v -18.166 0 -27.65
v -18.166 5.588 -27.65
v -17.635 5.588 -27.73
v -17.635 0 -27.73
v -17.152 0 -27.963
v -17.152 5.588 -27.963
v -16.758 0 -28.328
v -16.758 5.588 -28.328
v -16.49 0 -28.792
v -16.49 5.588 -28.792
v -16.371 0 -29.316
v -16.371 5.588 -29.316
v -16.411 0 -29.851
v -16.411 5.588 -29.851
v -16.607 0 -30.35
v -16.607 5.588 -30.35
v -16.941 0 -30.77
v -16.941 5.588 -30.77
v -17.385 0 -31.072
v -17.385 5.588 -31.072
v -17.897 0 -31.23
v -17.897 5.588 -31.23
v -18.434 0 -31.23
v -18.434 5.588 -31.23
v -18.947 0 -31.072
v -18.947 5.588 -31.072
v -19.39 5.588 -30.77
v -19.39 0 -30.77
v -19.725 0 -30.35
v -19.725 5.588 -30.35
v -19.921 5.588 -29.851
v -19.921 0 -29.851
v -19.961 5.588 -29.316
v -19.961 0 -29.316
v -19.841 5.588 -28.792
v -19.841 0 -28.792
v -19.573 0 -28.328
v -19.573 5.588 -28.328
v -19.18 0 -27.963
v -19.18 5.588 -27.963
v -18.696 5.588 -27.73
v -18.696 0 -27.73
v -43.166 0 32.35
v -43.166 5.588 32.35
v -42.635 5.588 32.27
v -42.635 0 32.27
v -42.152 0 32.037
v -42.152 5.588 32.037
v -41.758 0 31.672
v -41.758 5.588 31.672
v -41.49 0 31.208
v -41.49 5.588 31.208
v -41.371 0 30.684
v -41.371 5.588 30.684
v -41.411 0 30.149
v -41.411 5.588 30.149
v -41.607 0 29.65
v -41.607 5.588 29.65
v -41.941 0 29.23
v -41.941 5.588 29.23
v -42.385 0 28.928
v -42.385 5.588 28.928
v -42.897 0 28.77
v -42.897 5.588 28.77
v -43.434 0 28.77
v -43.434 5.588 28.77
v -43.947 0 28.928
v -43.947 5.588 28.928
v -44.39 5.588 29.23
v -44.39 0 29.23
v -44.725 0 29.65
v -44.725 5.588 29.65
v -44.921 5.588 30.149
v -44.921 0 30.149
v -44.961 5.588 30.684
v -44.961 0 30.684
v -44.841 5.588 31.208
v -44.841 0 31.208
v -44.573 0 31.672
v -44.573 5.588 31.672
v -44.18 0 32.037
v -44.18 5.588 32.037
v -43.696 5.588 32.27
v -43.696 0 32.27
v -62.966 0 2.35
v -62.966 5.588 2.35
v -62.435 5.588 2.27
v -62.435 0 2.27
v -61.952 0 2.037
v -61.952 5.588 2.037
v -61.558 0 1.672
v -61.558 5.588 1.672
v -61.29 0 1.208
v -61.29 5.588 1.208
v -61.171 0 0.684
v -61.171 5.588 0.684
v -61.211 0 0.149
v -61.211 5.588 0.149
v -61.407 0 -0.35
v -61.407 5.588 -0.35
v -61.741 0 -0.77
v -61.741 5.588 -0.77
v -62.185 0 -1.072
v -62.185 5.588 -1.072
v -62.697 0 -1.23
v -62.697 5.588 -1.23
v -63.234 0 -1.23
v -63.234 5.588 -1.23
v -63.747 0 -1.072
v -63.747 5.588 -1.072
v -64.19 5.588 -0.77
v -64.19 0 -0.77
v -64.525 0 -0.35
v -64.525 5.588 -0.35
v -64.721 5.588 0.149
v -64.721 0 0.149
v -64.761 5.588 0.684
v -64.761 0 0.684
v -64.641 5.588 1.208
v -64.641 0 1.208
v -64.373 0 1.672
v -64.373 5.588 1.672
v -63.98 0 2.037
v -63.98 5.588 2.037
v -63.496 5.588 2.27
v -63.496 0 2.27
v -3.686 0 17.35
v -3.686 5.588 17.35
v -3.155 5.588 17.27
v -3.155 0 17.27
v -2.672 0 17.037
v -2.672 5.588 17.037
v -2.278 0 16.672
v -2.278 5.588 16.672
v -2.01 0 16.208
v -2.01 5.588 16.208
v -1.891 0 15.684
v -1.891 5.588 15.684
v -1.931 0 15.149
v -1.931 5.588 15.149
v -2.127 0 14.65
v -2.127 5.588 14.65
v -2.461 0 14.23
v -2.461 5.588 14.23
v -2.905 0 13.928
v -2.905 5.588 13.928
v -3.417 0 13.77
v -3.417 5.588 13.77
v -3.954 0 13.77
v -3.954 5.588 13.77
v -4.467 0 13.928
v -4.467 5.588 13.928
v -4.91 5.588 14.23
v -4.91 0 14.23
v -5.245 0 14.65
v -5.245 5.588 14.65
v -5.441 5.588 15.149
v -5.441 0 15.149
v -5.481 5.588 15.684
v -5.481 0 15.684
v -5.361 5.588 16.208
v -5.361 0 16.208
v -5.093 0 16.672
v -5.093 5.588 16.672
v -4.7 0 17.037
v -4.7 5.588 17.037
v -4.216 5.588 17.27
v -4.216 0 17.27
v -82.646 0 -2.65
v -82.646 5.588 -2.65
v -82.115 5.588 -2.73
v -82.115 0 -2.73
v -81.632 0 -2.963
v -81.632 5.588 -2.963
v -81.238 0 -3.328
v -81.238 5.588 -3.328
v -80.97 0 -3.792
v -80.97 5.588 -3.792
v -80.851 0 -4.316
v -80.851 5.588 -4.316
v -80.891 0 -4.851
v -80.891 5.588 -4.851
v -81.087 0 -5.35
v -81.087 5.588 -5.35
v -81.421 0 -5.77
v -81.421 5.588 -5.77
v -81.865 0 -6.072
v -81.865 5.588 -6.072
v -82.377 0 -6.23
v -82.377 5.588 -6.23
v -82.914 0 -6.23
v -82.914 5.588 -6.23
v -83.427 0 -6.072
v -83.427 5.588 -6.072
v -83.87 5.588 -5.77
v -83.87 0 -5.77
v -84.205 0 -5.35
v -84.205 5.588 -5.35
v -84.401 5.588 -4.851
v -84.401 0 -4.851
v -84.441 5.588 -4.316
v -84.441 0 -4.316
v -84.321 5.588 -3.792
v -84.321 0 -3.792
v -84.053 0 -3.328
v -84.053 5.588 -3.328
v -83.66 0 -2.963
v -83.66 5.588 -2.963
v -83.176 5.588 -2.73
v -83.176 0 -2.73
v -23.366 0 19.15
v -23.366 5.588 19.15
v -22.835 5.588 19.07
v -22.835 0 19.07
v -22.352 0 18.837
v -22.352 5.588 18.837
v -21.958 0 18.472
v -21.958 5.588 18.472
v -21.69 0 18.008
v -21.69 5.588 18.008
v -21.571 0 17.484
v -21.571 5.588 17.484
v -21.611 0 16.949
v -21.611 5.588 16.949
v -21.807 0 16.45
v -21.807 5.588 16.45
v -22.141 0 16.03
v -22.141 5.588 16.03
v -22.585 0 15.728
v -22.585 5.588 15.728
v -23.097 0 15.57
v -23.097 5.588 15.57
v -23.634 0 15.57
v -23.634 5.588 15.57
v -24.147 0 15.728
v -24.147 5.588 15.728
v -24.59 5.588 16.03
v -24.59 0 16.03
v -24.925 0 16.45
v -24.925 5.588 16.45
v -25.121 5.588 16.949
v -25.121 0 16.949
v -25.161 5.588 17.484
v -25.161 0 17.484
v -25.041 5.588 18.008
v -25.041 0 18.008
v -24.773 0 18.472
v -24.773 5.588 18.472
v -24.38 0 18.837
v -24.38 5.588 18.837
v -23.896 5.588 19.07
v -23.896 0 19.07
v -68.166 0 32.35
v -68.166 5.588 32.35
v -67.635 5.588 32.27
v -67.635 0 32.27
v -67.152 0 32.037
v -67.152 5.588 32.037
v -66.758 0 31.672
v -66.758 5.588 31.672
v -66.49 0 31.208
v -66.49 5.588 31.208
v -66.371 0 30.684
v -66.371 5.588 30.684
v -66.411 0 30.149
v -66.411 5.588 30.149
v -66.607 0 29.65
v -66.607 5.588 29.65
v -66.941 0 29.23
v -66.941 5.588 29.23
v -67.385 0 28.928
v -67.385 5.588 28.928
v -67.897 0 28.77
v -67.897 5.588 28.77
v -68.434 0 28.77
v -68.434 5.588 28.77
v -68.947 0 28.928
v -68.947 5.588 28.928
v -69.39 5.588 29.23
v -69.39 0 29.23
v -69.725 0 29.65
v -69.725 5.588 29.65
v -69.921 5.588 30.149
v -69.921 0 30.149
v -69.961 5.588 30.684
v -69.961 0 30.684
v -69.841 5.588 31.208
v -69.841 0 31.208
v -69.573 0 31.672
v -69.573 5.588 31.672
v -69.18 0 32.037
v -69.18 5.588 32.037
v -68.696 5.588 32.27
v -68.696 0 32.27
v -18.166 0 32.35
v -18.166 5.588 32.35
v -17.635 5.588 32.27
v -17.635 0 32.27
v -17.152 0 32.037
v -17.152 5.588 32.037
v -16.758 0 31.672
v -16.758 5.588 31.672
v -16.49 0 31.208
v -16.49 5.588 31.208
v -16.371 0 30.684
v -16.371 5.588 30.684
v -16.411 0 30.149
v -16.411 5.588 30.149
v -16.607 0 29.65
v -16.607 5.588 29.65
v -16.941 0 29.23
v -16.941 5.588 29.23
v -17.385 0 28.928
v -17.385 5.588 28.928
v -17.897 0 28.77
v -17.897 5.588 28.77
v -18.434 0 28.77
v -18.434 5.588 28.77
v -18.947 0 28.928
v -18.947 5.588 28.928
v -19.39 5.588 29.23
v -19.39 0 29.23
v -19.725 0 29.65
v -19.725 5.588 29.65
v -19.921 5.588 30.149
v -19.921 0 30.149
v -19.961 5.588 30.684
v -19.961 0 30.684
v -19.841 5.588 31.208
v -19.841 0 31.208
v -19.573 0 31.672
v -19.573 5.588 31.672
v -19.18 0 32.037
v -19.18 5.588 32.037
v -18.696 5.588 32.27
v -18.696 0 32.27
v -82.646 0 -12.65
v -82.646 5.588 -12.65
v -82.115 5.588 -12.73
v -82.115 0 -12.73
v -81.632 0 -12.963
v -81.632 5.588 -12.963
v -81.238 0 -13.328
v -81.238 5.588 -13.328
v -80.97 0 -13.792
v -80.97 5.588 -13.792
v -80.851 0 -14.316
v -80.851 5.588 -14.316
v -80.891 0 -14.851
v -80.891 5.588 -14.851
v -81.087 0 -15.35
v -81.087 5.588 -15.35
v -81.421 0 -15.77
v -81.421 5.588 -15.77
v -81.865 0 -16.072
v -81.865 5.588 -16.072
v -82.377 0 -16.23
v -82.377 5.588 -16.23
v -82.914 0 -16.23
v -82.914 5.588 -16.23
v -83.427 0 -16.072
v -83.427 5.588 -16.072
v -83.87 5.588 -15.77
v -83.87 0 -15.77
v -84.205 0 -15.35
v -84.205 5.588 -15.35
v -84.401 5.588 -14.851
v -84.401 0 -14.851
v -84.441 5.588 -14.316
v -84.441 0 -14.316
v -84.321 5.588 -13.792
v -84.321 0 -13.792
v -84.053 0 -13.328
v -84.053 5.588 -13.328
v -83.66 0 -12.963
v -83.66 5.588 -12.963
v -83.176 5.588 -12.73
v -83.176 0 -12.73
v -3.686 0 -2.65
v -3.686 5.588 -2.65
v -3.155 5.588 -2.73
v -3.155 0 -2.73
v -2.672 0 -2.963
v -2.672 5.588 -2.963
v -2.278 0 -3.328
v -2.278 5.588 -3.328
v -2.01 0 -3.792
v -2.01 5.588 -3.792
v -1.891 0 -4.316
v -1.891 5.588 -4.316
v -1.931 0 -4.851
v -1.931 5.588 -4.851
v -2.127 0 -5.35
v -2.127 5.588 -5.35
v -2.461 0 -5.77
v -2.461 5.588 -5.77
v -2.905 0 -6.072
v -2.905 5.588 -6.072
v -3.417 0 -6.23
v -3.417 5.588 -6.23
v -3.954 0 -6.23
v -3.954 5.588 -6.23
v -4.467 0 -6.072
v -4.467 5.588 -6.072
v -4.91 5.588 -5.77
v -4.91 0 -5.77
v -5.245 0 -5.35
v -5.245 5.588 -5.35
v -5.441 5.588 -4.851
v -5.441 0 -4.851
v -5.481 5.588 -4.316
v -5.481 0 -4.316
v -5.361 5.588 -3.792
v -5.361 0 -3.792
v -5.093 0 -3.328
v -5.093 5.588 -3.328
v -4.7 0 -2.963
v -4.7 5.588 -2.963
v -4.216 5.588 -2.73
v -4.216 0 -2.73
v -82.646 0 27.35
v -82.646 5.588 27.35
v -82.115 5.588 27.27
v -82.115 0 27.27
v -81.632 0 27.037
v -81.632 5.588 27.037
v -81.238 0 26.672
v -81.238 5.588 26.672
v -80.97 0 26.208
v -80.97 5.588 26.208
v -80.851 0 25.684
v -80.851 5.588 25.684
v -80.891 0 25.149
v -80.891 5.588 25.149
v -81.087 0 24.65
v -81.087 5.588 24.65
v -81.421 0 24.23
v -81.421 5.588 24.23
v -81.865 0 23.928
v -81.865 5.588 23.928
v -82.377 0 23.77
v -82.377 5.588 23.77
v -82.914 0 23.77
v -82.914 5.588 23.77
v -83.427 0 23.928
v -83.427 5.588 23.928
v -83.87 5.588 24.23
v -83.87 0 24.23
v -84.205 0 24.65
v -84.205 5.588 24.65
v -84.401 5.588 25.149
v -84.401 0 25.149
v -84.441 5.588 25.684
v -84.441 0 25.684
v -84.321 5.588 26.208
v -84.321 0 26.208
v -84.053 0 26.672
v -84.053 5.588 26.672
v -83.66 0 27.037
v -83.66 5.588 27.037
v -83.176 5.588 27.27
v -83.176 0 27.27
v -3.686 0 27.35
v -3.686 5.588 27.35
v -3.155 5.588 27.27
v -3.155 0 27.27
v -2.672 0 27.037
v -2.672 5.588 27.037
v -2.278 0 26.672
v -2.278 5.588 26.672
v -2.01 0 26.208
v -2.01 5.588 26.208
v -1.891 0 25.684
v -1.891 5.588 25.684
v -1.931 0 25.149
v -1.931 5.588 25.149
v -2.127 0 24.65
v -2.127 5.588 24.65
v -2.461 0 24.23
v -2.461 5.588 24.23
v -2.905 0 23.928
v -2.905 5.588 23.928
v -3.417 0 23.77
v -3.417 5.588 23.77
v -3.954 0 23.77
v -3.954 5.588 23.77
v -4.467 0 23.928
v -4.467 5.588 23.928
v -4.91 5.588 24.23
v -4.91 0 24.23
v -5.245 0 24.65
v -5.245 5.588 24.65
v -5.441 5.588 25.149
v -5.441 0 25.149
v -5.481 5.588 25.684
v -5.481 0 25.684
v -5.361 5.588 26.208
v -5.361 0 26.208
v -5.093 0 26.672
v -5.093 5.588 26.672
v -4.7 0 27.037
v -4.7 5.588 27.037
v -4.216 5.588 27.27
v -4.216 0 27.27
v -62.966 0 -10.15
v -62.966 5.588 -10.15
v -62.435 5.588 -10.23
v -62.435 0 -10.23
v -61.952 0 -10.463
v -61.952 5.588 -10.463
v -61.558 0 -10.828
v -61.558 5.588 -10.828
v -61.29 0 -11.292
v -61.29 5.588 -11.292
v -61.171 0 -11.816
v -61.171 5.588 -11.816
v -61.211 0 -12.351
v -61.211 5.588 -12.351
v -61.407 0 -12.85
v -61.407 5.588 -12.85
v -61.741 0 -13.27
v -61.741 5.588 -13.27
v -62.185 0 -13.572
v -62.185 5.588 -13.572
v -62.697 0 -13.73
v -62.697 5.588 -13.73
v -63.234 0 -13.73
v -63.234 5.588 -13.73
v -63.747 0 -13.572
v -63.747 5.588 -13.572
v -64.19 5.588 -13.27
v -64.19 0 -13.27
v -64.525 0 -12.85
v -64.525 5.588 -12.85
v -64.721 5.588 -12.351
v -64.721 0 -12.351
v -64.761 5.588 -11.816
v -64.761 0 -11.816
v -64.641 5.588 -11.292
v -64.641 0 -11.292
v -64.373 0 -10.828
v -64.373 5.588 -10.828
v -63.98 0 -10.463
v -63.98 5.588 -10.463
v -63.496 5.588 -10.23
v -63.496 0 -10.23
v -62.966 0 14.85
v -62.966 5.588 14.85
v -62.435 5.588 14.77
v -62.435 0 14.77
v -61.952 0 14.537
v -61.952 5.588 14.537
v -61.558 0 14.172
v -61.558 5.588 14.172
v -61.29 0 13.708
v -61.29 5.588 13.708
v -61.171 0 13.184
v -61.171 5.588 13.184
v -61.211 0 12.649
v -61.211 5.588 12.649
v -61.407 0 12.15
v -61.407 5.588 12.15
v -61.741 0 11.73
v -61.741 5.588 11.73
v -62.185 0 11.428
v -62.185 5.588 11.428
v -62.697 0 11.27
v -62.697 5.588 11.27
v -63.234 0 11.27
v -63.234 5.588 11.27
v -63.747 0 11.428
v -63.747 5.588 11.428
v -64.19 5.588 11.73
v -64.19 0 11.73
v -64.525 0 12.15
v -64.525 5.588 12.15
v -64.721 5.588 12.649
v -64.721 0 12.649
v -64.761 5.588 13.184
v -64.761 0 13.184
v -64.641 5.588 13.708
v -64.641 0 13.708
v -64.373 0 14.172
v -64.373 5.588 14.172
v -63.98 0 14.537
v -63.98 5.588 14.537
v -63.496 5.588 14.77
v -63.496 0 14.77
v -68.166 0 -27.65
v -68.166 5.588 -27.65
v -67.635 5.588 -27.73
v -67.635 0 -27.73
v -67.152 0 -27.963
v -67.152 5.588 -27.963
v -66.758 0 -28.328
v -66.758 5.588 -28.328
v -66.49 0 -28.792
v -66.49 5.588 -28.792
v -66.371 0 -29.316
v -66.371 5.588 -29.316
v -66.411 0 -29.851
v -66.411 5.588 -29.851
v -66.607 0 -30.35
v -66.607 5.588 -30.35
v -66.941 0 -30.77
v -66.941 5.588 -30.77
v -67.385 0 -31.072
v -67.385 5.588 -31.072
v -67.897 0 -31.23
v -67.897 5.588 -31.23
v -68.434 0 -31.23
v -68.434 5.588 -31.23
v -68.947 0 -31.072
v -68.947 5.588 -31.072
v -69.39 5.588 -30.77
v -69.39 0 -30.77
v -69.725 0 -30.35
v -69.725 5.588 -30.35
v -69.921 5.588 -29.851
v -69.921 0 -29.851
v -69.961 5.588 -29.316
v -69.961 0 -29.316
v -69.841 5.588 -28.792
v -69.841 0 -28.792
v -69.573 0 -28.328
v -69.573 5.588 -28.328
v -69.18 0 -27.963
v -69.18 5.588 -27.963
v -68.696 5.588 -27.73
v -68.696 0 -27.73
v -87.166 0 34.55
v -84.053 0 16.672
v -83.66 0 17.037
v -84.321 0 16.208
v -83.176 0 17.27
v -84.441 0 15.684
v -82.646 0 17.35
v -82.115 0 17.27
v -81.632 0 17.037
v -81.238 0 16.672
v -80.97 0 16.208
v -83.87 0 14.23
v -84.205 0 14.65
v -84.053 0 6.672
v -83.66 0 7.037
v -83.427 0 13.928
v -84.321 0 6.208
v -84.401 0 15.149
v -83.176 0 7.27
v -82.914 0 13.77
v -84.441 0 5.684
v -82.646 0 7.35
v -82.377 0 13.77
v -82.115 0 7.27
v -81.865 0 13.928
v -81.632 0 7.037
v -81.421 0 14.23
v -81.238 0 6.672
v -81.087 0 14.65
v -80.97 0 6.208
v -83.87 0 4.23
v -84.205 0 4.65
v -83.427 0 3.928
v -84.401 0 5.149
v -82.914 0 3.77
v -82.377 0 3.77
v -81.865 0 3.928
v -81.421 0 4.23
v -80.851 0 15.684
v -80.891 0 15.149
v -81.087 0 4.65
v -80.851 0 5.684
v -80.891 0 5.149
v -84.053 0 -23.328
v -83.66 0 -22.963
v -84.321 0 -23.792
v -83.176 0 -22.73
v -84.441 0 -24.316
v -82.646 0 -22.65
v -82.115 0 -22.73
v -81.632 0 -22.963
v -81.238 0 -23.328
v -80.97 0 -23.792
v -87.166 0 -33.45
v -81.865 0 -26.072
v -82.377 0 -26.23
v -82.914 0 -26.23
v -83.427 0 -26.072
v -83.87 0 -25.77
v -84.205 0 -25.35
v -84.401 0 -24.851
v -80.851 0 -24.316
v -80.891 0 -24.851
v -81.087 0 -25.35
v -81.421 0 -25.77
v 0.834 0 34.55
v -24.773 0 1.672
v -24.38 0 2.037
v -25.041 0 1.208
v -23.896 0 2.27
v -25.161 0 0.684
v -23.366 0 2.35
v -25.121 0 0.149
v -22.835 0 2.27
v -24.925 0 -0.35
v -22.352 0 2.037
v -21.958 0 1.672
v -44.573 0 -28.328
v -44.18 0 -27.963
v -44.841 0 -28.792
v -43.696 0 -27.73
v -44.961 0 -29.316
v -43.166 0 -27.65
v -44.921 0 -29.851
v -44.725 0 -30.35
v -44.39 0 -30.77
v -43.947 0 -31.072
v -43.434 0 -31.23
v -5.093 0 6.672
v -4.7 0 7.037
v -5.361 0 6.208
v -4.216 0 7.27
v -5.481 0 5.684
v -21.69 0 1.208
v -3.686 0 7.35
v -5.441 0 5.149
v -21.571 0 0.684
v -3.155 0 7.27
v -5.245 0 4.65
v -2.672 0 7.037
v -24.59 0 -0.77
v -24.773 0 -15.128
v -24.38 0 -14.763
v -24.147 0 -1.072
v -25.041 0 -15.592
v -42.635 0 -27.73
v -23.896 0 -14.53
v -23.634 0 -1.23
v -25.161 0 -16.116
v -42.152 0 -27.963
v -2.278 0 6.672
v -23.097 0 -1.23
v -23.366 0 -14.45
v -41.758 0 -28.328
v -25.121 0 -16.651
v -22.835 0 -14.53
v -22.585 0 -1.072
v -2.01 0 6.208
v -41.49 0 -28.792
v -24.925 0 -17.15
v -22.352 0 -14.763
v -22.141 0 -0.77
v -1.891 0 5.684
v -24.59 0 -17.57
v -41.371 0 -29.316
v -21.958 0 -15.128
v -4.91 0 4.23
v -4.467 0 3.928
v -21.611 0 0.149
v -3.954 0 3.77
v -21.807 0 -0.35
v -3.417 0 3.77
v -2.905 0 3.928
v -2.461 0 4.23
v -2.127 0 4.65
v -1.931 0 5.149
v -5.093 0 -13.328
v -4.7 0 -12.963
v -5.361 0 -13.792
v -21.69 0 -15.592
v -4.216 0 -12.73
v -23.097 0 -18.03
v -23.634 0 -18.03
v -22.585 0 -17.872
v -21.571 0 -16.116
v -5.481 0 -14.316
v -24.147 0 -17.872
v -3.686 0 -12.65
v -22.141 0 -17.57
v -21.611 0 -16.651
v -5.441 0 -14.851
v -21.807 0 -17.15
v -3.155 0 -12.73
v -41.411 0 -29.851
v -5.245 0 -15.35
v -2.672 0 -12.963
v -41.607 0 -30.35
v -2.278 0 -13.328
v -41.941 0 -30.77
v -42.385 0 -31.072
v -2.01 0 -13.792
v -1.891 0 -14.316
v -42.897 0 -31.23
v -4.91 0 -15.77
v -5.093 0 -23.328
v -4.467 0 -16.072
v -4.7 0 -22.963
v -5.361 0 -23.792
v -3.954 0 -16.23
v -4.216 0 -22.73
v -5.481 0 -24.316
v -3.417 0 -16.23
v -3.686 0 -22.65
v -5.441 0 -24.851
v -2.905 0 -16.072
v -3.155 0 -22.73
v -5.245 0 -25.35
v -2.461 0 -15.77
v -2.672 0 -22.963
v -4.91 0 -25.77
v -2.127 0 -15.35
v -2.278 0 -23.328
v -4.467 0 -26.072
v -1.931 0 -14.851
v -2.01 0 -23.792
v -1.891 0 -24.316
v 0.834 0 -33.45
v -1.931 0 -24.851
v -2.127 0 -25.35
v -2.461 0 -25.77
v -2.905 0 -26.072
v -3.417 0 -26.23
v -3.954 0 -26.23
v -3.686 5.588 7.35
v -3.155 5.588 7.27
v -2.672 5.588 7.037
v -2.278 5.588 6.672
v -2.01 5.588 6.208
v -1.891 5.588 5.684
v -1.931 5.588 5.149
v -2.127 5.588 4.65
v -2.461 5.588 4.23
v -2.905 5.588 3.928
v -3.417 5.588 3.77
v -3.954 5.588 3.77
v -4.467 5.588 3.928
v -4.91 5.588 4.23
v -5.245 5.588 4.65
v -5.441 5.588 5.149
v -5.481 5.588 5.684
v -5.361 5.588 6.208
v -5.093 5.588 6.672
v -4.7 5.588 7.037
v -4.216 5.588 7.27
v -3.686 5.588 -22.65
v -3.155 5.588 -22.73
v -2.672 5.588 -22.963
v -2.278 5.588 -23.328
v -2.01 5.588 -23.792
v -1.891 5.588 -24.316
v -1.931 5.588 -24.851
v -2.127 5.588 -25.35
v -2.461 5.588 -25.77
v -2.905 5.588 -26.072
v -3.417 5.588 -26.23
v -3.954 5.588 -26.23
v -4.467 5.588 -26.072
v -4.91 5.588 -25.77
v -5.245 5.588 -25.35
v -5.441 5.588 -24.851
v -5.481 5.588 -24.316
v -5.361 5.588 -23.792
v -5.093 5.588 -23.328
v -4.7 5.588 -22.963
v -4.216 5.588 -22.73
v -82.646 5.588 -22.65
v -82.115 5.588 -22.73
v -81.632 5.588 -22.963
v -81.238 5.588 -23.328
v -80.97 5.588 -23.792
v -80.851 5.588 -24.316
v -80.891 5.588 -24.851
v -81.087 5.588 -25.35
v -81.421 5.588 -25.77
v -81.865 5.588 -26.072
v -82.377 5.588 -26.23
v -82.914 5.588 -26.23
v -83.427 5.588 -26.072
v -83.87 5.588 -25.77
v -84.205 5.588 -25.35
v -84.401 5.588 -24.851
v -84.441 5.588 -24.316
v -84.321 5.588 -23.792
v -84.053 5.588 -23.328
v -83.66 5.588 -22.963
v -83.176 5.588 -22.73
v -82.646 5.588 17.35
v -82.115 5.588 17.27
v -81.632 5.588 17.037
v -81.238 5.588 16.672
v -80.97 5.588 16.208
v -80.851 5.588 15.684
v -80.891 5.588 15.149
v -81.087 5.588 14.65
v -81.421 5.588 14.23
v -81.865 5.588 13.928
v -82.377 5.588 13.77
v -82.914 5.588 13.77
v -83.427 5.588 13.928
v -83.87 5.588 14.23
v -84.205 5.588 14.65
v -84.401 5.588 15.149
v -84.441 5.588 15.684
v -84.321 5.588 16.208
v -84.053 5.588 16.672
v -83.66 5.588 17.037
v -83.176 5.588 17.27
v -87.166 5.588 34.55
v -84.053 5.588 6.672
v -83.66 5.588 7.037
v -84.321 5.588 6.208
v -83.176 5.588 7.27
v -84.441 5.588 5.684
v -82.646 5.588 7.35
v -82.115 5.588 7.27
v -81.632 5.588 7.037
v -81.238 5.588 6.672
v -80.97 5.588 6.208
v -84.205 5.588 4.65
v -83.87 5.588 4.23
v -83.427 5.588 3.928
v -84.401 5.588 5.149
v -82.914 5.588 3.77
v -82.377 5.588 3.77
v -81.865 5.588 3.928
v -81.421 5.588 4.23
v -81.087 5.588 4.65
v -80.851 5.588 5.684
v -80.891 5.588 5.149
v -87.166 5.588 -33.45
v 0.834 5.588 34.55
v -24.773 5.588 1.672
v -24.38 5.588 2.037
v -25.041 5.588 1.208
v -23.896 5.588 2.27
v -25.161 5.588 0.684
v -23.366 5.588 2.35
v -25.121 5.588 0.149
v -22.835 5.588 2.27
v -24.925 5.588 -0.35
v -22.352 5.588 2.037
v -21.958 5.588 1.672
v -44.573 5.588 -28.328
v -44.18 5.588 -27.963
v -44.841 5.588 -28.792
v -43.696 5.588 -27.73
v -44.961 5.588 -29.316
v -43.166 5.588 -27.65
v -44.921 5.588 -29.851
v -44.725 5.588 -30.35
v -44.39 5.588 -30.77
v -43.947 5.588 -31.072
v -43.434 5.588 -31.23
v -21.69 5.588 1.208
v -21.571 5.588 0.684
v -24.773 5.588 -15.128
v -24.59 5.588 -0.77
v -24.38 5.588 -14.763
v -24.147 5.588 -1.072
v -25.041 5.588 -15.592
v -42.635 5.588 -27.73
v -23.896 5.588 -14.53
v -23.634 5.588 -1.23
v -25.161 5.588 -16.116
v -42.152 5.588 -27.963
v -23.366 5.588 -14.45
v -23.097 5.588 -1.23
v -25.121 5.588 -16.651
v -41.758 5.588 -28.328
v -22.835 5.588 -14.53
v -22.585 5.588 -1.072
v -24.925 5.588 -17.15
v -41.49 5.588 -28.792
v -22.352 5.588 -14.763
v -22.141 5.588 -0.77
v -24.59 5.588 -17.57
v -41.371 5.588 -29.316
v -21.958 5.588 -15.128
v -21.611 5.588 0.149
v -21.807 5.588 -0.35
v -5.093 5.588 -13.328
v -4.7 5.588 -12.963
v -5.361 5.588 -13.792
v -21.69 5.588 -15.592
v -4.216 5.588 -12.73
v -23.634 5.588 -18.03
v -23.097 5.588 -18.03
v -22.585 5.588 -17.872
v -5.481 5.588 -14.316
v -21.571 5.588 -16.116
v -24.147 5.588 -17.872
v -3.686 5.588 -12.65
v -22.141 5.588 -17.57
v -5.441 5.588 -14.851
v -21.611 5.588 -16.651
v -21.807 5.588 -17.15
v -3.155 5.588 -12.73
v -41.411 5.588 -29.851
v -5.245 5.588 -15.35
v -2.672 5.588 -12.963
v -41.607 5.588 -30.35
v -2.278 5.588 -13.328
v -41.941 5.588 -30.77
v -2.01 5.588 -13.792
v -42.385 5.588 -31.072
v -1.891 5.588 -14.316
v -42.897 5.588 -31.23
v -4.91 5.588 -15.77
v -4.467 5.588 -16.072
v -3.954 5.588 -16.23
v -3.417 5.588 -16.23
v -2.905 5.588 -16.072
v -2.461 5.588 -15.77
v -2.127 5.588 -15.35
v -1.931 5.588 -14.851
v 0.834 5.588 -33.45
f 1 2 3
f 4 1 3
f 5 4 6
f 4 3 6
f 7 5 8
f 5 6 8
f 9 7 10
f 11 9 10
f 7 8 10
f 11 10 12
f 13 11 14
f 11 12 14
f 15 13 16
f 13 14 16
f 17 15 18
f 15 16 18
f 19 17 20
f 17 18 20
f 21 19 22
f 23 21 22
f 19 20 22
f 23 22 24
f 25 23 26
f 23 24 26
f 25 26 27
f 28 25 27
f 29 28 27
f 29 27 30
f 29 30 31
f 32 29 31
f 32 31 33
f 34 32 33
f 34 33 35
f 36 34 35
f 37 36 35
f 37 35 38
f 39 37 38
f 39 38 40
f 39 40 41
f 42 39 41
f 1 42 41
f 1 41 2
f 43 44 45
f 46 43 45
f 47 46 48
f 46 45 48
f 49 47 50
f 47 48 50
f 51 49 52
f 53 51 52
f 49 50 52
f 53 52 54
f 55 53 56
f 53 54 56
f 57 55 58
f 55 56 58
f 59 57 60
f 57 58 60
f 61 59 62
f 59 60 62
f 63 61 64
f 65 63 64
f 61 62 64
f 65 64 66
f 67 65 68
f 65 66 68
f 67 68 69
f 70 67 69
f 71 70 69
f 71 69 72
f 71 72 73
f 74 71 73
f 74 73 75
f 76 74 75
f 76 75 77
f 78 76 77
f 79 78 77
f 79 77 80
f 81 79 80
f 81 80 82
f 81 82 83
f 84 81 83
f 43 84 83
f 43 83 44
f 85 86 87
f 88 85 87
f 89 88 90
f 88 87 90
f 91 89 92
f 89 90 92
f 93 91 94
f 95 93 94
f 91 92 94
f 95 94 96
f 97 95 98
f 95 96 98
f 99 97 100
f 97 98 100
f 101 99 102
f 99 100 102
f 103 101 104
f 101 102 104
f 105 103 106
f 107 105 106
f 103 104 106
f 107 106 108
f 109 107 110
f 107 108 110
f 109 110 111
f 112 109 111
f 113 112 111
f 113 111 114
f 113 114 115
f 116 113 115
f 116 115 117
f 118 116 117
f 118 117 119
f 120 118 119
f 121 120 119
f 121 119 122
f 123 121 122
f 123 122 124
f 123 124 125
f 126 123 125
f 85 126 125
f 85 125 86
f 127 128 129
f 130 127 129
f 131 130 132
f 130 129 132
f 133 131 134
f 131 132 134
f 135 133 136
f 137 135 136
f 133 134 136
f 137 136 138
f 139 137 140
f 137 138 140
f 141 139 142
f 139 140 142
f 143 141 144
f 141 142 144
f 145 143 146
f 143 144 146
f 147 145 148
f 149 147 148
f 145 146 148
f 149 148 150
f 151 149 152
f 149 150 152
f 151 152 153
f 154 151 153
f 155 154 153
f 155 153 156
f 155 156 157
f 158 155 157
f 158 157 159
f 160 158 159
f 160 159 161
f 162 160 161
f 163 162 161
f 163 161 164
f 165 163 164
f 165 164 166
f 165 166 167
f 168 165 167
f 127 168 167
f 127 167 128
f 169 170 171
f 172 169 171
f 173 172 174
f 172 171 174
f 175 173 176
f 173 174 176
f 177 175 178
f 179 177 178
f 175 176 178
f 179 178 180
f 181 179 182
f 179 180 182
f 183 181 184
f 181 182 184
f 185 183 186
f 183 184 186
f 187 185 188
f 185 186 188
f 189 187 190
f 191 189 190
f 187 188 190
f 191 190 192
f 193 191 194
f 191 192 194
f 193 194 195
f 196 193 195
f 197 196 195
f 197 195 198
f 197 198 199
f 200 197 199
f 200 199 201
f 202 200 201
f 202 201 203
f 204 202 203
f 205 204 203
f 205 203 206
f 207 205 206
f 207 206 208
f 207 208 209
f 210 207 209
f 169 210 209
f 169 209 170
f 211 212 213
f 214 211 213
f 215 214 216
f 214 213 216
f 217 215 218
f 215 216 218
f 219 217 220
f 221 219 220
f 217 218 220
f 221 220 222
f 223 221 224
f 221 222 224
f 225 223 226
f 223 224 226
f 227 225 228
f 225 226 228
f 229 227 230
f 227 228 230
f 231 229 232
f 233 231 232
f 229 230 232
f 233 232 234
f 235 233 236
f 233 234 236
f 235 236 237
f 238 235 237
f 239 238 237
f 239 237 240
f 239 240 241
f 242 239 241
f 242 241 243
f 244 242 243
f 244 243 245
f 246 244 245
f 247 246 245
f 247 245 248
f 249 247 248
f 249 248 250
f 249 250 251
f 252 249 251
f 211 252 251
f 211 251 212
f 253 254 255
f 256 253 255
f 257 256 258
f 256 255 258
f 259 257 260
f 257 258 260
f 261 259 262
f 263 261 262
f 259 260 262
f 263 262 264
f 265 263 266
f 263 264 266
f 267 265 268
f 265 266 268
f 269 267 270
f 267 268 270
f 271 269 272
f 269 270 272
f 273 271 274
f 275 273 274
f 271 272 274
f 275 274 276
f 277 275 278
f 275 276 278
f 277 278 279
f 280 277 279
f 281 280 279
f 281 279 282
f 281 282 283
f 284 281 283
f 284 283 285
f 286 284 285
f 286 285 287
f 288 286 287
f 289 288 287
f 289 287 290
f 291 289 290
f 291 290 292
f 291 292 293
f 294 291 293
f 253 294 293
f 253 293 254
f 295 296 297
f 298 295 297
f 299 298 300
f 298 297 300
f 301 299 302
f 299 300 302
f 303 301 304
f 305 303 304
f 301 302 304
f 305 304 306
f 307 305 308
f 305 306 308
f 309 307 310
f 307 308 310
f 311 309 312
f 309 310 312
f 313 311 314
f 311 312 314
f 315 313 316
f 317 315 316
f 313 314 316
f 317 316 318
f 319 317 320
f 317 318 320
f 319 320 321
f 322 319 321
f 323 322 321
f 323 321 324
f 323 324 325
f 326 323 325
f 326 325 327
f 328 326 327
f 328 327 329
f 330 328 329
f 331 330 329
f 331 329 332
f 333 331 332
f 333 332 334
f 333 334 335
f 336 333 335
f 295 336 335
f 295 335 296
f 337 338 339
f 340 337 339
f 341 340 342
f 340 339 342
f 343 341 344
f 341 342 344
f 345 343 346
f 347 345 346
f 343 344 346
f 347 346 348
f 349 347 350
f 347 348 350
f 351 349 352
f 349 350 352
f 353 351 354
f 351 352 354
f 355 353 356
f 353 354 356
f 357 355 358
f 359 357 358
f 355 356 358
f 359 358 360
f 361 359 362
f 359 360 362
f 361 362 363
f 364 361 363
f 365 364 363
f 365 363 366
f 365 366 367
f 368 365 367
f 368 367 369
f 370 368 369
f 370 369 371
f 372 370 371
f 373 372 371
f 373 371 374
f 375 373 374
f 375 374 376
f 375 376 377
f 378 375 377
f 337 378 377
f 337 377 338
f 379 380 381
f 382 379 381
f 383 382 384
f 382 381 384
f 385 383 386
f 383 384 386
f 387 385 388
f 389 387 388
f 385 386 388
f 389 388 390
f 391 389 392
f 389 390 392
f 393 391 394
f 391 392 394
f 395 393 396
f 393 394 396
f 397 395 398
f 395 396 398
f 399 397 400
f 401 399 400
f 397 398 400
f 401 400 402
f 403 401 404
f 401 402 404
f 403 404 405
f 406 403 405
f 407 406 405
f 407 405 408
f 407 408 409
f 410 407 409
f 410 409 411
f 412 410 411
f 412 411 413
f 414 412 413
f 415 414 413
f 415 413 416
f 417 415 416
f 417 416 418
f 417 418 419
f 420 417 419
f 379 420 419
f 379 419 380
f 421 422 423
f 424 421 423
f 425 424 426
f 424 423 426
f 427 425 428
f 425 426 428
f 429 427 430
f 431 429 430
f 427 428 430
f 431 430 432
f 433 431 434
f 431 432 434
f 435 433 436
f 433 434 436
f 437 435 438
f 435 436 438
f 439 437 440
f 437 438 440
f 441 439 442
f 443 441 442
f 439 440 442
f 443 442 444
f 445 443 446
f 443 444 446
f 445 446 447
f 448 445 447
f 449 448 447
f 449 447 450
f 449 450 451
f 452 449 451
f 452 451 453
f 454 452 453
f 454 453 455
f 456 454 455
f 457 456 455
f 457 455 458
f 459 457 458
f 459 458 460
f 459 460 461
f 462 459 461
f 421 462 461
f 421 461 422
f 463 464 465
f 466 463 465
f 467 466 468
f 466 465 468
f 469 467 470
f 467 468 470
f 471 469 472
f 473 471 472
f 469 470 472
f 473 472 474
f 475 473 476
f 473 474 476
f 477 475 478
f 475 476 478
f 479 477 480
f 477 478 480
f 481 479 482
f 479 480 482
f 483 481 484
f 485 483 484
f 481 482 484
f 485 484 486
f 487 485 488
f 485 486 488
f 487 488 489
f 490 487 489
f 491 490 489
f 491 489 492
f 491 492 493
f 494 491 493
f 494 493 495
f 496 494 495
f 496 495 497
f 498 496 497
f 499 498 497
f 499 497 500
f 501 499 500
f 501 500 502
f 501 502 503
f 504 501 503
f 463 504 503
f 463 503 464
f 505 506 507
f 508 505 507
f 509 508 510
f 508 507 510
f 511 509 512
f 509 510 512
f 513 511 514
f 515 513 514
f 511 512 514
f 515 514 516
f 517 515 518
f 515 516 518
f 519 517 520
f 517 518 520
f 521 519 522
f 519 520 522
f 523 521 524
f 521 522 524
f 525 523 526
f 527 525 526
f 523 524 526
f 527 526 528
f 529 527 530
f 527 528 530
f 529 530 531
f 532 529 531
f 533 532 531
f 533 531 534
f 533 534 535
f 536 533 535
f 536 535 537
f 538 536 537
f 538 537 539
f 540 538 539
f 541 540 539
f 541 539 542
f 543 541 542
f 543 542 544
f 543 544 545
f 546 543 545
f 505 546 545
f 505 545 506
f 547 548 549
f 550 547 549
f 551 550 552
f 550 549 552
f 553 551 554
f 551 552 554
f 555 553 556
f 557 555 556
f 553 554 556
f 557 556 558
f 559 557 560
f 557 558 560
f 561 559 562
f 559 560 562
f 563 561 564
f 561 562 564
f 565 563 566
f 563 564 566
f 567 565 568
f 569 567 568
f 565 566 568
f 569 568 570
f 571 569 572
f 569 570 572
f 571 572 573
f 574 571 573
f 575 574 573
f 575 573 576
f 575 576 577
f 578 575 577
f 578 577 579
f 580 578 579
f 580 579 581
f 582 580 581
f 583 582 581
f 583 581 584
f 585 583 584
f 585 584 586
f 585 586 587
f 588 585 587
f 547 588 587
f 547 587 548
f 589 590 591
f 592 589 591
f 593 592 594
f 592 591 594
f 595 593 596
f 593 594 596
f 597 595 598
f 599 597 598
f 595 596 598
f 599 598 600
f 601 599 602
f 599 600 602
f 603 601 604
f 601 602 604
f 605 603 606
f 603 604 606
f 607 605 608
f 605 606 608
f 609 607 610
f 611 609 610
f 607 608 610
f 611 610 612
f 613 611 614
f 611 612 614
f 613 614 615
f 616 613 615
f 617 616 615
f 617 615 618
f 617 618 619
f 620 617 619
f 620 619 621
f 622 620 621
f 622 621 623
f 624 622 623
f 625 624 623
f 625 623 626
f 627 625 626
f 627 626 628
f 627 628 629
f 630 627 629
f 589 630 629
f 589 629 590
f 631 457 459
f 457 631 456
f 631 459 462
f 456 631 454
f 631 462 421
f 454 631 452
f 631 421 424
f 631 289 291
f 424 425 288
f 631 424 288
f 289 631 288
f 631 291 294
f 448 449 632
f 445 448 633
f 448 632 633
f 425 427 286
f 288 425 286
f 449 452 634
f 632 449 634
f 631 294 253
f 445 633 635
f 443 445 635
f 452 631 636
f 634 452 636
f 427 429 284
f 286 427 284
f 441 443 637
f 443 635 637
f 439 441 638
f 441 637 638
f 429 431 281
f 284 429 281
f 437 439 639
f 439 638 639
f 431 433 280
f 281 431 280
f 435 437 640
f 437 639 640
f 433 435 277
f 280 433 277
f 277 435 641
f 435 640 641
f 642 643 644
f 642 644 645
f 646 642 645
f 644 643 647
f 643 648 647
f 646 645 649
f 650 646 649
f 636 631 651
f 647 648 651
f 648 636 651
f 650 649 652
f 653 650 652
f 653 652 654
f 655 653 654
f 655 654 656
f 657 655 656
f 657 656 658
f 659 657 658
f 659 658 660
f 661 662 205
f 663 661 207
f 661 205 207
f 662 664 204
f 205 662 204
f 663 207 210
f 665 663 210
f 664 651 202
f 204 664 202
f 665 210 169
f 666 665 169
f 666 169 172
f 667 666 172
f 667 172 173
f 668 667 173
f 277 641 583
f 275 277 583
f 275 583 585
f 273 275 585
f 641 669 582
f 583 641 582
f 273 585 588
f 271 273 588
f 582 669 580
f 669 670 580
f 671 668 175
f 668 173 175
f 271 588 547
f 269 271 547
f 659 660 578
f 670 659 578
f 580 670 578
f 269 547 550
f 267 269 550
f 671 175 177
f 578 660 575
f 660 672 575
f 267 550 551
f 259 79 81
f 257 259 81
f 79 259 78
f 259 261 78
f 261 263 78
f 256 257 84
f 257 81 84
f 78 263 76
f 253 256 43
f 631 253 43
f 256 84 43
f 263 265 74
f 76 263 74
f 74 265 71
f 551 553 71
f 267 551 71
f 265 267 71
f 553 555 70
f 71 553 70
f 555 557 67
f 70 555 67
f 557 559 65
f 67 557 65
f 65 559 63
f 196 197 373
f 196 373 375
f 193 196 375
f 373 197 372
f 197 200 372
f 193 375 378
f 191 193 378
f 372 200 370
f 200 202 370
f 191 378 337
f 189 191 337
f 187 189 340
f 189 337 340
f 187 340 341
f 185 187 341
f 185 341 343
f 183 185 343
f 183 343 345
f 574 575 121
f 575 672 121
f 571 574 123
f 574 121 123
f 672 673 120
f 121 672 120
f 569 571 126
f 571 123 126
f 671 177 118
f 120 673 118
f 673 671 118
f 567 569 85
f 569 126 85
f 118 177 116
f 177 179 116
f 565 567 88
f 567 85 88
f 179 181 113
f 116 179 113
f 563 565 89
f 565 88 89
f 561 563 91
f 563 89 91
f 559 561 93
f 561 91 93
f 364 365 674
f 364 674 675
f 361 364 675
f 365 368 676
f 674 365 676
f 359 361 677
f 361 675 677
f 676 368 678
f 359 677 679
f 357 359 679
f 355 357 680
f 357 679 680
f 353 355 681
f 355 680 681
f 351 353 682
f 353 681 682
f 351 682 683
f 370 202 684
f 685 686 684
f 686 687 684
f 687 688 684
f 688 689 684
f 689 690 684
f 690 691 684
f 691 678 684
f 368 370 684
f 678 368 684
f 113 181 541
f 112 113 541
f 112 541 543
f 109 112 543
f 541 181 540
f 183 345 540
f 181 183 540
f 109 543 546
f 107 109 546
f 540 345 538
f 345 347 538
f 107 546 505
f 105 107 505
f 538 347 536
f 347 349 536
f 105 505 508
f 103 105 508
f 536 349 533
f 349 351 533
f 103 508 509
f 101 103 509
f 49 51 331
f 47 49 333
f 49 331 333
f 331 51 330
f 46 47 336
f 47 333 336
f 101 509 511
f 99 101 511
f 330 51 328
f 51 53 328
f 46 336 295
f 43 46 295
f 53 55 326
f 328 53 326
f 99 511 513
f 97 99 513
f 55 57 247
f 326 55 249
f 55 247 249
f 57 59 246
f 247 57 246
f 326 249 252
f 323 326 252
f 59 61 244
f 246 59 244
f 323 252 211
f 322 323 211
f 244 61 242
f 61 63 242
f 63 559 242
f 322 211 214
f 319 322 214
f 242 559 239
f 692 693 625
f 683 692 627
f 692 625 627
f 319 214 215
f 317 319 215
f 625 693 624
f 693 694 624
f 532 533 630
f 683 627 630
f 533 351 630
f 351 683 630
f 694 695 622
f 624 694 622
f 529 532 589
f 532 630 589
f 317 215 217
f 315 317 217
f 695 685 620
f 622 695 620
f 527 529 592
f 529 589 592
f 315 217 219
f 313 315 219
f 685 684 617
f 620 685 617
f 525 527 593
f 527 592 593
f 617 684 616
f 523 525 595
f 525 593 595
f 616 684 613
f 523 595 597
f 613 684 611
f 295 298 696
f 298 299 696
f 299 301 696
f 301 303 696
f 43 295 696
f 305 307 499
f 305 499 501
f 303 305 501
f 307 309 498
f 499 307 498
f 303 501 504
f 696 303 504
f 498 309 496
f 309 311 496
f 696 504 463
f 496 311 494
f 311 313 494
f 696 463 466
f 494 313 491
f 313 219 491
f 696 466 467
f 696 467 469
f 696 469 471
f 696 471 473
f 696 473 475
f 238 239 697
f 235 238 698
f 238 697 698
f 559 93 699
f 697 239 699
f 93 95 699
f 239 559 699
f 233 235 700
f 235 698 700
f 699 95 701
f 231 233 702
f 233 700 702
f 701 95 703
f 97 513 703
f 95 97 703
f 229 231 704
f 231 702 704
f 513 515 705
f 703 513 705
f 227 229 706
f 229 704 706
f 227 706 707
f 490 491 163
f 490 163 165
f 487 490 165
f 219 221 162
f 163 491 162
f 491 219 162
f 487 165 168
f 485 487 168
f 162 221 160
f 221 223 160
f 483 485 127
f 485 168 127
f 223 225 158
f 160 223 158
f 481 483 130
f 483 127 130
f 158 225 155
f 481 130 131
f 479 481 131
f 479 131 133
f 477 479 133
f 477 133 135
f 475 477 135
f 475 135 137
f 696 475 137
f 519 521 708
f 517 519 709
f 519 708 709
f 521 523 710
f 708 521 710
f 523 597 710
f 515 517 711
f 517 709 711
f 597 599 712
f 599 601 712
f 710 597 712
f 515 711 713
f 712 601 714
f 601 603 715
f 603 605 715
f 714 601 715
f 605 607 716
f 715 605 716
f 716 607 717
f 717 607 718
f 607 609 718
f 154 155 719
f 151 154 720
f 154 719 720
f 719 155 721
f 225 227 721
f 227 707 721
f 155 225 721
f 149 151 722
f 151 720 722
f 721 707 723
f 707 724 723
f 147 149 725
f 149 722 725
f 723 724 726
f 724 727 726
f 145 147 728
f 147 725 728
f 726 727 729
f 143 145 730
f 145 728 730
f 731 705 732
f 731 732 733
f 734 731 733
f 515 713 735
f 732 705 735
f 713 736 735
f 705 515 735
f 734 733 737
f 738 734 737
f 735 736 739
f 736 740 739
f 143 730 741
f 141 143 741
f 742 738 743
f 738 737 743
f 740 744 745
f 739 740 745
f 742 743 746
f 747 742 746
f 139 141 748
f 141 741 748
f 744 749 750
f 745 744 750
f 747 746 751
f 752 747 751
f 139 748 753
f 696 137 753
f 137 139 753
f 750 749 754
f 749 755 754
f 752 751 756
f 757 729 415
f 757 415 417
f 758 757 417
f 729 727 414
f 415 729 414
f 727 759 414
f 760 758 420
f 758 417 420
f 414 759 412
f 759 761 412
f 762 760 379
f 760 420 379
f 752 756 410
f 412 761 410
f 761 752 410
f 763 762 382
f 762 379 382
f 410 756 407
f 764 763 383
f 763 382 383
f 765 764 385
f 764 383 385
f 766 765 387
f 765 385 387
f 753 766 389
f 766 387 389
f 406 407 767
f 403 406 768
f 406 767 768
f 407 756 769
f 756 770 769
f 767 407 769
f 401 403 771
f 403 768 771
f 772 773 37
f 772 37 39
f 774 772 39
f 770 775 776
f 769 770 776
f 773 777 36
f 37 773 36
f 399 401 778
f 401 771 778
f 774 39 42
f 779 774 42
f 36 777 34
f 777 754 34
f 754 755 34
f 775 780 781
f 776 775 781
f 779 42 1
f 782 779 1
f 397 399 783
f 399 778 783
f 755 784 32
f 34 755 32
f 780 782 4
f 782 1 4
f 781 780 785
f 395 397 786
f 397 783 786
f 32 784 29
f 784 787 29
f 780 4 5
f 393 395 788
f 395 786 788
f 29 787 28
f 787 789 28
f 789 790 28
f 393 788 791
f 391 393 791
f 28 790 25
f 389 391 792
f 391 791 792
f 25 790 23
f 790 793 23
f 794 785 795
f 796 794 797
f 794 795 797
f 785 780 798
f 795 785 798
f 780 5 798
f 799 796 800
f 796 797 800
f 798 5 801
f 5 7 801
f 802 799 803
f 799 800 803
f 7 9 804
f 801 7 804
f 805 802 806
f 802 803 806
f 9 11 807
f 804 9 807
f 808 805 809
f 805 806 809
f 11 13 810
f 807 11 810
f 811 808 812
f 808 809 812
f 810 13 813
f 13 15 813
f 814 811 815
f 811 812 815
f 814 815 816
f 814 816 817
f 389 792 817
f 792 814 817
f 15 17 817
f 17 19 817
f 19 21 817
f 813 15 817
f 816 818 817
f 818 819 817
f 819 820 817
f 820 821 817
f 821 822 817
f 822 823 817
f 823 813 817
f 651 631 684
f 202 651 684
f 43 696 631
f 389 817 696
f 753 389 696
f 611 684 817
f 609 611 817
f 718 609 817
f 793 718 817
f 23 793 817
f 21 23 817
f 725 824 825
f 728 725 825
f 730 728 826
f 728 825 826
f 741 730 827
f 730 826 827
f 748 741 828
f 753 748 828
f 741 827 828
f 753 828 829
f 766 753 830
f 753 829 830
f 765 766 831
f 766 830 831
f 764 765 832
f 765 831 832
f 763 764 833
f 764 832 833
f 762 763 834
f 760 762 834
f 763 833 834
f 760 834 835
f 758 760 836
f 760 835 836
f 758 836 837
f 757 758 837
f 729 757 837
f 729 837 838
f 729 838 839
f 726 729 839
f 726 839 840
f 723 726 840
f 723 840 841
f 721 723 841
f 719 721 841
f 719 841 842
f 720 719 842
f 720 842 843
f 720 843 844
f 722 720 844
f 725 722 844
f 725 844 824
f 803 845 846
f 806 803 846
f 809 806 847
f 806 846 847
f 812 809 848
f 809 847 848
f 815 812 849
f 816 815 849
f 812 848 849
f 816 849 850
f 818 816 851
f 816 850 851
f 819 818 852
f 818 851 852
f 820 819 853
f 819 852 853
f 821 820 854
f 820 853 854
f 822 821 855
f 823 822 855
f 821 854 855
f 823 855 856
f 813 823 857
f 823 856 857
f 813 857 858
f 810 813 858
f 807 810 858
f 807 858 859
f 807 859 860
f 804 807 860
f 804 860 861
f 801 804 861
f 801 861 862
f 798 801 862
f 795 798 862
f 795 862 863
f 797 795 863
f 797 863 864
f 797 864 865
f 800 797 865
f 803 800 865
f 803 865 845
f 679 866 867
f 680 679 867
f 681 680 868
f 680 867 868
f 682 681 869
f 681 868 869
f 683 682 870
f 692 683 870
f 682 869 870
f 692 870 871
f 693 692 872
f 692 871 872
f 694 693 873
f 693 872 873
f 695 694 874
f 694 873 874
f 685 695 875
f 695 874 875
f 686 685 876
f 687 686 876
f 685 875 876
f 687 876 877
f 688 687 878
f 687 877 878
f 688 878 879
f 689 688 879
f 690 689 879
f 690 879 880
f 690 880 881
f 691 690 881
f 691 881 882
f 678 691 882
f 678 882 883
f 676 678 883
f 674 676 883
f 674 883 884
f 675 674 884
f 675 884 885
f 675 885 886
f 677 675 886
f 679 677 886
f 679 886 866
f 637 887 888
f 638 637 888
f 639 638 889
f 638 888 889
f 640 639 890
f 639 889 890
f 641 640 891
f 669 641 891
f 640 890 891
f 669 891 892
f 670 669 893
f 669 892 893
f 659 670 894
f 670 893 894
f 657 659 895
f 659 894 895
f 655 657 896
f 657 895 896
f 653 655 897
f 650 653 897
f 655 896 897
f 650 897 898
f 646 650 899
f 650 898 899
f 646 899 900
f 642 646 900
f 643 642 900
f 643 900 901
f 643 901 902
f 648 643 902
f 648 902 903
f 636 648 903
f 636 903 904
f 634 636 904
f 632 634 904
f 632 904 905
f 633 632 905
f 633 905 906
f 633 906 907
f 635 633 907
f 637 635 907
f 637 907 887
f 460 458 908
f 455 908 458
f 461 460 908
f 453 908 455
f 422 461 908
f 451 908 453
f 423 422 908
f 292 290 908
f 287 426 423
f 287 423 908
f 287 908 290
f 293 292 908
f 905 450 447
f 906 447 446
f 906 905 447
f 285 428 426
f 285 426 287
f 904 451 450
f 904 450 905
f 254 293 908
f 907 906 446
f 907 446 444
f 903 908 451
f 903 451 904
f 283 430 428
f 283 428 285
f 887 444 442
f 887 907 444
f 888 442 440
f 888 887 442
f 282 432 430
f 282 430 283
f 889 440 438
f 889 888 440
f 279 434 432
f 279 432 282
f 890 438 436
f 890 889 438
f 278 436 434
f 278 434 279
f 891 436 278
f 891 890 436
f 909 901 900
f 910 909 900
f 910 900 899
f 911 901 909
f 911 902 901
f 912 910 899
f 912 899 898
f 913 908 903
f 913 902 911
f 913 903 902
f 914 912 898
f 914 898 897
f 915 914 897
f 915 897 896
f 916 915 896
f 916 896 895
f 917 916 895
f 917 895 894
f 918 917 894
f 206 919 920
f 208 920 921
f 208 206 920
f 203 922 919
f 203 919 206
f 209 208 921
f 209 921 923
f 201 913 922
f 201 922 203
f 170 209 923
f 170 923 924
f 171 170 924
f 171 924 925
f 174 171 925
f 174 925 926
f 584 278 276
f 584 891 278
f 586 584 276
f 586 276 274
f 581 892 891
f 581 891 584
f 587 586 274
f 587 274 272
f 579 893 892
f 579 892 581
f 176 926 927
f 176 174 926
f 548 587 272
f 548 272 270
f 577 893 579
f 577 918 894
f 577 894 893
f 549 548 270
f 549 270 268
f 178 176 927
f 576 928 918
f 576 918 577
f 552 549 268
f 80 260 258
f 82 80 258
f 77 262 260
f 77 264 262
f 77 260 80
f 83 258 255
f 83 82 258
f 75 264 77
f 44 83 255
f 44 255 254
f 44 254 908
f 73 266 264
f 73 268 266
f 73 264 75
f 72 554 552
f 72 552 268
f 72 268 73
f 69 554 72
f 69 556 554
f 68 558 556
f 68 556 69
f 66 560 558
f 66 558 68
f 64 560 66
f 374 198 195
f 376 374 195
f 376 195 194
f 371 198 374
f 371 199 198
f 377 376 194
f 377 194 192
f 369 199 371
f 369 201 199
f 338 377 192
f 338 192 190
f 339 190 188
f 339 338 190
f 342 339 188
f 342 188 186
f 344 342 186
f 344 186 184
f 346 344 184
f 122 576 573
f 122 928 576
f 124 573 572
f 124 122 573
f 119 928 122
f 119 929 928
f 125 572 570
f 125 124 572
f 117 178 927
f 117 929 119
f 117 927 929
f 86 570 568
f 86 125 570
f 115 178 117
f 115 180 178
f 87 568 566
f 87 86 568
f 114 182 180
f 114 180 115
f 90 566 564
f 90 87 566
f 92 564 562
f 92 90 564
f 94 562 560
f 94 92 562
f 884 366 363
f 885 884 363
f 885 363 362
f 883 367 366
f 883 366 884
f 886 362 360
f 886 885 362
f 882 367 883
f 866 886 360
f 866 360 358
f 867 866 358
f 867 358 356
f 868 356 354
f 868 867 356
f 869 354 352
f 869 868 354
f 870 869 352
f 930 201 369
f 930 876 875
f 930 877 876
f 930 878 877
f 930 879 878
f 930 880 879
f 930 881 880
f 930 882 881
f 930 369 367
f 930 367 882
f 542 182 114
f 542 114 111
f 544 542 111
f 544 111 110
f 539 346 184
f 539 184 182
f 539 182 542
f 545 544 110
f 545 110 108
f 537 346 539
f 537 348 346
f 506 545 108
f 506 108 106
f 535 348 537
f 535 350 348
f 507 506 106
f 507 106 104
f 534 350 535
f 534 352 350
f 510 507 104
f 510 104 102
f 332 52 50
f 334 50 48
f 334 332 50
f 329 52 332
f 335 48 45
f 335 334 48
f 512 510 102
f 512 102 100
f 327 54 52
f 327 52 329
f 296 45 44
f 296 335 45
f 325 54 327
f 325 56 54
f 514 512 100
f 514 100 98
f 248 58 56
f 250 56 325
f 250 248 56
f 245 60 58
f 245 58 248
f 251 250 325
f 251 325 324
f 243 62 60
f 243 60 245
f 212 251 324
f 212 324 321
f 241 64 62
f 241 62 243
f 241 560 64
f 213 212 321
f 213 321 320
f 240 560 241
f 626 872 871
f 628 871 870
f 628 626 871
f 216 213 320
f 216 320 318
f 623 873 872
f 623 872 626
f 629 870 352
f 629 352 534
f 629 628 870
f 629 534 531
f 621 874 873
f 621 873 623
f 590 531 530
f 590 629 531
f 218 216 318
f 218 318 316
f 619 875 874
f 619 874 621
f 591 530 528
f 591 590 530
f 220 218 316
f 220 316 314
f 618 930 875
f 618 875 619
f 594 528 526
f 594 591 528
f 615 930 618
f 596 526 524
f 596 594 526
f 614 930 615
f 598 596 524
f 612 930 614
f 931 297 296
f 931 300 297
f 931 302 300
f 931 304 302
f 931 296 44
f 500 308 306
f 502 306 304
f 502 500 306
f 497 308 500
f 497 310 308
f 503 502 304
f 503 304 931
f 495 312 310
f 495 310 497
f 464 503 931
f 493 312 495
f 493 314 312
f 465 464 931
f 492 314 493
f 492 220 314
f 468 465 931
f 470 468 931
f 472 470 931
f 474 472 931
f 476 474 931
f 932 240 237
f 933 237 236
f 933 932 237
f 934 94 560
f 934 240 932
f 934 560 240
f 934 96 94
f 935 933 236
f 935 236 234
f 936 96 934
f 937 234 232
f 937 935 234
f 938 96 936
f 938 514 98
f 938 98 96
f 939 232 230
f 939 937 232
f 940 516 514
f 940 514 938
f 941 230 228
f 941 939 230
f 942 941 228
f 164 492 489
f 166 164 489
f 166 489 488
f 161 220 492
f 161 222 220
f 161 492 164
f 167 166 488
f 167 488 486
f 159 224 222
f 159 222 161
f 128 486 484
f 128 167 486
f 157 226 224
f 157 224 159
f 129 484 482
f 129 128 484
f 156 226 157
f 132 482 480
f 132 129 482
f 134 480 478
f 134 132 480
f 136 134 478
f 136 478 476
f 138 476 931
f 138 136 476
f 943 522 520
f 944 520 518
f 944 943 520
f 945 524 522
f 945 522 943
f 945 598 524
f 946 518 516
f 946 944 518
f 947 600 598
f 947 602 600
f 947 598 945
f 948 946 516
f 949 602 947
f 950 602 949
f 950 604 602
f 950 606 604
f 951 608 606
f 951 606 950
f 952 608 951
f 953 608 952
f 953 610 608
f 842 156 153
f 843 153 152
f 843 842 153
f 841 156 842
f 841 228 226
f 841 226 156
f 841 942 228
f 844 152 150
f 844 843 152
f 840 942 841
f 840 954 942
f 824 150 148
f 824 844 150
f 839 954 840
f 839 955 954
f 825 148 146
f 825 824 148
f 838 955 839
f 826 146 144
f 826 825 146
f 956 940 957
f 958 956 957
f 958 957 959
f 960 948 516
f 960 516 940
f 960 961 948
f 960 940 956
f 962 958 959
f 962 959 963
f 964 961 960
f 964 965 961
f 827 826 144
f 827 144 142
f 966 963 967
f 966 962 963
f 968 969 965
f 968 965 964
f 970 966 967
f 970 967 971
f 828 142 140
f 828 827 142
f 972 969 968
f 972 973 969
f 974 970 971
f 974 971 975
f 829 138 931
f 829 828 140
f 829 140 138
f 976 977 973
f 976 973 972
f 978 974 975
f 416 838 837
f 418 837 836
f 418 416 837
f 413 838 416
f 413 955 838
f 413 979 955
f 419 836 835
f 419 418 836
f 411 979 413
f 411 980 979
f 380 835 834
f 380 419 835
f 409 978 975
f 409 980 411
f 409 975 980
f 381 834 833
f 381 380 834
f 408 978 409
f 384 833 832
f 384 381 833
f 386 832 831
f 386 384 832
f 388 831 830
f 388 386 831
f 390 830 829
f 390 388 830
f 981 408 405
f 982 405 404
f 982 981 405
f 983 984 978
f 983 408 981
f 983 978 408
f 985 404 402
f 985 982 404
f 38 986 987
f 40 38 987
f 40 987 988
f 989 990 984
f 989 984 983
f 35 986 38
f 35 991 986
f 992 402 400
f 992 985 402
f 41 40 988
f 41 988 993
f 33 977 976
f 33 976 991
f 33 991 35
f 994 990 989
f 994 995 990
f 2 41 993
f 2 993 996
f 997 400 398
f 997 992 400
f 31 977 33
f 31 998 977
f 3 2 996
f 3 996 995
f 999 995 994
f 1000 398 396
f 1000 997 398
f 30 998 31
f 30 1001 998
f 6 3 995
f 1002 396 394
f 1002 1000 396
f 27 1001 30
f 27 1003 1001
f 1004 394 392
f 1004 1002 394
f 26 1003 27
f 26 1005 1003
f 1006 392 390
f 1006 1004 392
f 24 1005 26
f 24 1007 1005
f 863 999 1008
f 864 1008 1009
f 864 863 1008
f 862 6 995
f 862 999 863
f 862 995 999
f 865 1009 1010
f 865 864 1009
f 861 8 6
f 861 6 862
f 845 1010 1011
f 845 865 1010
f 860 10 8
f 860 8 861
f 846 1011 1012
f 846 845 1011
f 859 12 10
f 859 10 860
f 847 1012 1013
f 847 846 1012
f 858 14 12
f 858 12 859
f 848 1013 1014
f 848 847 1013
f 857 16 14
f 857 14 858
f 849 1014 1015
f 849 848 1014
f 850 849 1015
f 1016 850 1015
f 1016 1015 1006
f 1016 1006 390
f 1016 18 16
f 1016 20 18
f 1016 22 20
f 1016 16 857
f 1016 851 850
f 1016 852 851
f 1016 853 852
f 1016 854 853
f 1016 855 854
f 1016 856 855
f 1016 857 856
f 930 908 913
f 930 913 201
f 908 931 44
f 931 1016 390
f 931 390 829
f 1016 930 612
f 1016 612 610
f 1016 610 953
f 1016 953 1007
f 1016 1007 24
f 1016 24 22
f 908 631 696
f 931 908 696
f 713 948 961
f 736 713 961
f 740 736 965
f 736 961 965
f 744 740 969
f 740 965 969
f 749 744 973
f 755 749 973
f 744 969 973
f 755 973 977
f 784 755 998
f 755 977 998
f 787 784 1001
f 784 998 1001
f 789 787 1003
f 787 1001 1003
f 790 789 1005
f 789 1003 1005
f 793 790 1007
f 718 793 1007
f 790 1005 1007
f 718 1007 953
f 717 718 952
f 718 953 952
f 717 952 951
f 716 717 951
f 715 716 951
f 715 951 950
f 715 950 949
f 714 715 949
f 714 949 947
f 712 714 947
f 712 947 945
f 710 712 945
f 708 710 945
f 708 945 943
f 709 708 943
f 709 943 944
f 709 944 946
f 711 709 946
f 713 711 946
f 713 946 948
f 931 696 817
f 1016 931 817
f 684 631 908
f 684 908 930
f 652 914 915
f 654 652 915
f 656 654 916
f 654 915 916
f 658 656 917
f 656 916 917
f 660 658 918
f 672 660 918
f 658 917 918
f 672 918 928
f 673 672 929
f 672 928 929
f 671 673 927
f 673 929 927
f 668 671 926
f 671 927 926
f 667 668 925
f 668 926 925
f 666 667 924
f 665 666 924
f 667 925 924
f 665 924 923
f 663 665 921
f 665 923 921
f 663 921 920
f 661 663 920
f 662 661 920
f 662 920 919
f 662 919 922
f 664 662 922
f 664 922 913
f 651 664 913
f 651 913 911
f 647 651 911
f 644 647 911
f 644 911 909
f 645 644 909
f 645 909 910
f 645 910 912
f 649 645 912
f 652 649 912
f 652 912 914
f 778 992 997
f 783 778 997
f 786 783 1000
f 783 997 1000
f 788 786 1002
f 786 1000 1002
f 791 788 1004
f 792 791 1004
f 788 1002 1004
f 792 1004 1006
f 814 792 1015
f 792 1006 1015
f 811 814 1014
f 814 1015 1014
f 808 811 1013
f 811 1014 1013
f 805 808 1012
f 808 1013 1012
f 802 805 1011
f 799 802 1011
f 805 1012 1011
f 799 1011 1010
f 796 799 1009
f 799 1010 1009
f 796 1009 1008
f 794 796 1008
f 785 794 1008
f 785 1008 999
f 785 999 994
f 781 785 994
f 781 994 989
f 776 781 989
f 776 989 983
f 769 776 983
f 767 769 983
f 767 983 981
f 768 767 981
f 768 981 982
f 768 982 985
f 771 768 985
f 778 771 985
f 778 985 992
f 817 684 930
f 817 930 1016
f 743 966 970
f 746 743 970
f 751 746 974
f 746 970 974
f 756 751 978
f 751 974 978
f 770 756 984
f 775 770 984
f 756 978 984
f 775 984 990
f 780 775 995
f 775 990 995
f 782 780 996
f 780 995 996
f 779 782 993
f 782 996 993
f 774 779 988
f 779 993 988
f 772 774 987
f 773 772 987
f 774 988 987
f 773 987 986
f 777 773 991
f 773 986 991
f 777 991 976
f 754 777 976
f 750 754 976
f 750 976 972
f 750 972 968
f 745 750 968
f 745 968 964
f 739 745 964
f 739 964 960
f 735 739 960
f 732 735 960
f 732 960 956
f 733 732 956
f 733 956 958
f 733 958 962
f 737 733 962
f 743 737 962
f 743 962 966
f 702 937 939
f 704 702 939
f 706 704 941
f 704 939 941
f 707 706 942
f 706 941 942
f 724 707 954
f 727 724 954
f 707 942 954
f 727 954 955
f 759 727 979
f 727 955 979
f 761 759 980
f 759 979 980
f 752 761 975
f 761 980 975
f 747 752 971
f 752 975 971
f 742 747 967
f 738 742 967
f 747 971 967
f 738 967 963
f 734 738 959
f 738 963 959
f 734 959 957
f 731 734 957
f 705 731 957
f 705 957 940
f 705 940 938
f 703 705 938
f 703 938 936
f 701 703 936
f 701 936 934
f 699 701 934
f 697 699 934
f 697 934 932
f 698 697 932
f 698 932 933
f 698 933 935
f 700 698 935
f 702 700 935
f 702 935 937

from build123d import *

# Parameters (mm, degrees)
SKETCH1_W           = 88
SKETCH1_H           = 68
BOSS_EXTRUDE1_DEPTH = 5.588
SKETCH2_R           = 1.8
CUT_EXTRUDE1_DEPTH  = 94.929750833


with BuildPart() as part:
    # Sketch1 → Boss-Extrude1 (new body)
    with BuildSketch(Plane(origin=(0, 0, 0), x_dir=(1, 0, 0), z_dir=(0, 1, 0))):
        with Locations((-43.165773612, -0.549967556)):
            Rectangle(SKETCH1_W, SKETCH1_H)
    extrude(amount=BOSS_EXTRUDE1_DEPTH)

    # Sketch2 → Cut-Extrude1 (cut, through all)
    with BuildSketch(Plane(origin=(0, 5.588, 0), x_dir=(1, 0, 0), z_dir=(0, 1, 0))):
        with Locations(Location((-68.165773612, 29.450032444, 0), (0, 0, 270))):
            Circle(SKETCH2_R)
        with Locations(Location((-43.165773612, 29.450032444, 0), (0, 0, 270))):
            Circle(SKETCH2_R)
        with Locations(Location((-18.165773612, 29.450032444, 0), (0, 0, 270))):
            Circle(SKETCH2_R)
        with Locations(Location((-43.165773612, -30.549967556, 0), (0, 0, 270))):
            Circle(SKETCH2_R)
        with Locations(Location((-68.165773612, -30.549967556, 0), (0, 0, 270))):
            Circle(SKETCH2_R)
        with Locations(Location((-18.165773612, -30.549967556, 0), (0, 0, 270))):
            Circle(SKETCH2_R)
        with Locations(Location((-62.965773612, -0.549967556, 0), (0, 0, 270))):
            Circle(SKETCH2_R)
        with Locations(Location((-23.365773612, -0.549967556, 0), (0, 0, 270))):
            Circle(SKETCH2_R)
        with Locations(Location((-23.365773612, -17.349967556, 0), (0, 0, 270))):
            Circle(SKETCH2_R)
        with Locations(Location((-23.365773612, 16.250032444, 0), (0, 0, 270))):
            Circle(SKETCH2_R)
        with Locations(Location((-62.965773612, -13.049967556, 0), (0, 0, 270))):
            Circle(SKETCH2_R)
        with Locations(Location((-62.965773612, 11.950032444, 0), (0, 0, 270))):
            Circle(SKETCH2_R)
        with Locations(Location((-82.645773612, 24.450032444, 0), (0, 0, 270))):
            Circle(SKETCH2_R)
        with Locations(Location((-3.685773612, 24.450032444, 0), (0, 0, 270))):
            Circle(SKETCH2_R)
        with Locations(Location((-82.645773612, 14.450032444, 0), (0, 0, 270))):
            Circle(SKETCH2_R)
        with Locations(Location((-3.685773612, 14.450032444, 0), (0, 0, 270))):
            Circle(SKETCH2_R)
        with Locations(Location((-82.645773612, 4.450032444, 0), (0, 0, 270))):
            Circle(SKETCH2_R)
        with Locations(Location((-3.685773612, 4.450032444, 0), (0, 0, 270))):
            Circle(SKETCH2_R)
        with Locations(Location((-82.645773612, -5.549967556, 0), (0, 0, 270))):
            Circle(SKETCH2_R)
        with Locations(Location((-3.685773612, -5.549967556, 0), (0, 0, 270))):
            Circle(SKETCH2_R)
        with Locations(Location((-82.645773612, -15.549967556, 0), (0, 0, 270))):
            Circle(SKETCH2_R)
        with Locations(Location((-3.685773612, -15.549967556, 0), (0, 0, 270))):
            Circle(SKETCH2_R)
        with Locations(Location((-82.645773612, -25.549967556, 0), (0, 0, 270))):
            Circle(SKETCH2_R)
        with Locations(Location((-3.685773612, -25.549967556, 0), (0, 0, 270))):
            Circle(SKETCH2_R)
    extrude(amount=-CUT_EXTRUDE1_DEPTH, mode=Mode.SUBTRACT)


solid = part.part
